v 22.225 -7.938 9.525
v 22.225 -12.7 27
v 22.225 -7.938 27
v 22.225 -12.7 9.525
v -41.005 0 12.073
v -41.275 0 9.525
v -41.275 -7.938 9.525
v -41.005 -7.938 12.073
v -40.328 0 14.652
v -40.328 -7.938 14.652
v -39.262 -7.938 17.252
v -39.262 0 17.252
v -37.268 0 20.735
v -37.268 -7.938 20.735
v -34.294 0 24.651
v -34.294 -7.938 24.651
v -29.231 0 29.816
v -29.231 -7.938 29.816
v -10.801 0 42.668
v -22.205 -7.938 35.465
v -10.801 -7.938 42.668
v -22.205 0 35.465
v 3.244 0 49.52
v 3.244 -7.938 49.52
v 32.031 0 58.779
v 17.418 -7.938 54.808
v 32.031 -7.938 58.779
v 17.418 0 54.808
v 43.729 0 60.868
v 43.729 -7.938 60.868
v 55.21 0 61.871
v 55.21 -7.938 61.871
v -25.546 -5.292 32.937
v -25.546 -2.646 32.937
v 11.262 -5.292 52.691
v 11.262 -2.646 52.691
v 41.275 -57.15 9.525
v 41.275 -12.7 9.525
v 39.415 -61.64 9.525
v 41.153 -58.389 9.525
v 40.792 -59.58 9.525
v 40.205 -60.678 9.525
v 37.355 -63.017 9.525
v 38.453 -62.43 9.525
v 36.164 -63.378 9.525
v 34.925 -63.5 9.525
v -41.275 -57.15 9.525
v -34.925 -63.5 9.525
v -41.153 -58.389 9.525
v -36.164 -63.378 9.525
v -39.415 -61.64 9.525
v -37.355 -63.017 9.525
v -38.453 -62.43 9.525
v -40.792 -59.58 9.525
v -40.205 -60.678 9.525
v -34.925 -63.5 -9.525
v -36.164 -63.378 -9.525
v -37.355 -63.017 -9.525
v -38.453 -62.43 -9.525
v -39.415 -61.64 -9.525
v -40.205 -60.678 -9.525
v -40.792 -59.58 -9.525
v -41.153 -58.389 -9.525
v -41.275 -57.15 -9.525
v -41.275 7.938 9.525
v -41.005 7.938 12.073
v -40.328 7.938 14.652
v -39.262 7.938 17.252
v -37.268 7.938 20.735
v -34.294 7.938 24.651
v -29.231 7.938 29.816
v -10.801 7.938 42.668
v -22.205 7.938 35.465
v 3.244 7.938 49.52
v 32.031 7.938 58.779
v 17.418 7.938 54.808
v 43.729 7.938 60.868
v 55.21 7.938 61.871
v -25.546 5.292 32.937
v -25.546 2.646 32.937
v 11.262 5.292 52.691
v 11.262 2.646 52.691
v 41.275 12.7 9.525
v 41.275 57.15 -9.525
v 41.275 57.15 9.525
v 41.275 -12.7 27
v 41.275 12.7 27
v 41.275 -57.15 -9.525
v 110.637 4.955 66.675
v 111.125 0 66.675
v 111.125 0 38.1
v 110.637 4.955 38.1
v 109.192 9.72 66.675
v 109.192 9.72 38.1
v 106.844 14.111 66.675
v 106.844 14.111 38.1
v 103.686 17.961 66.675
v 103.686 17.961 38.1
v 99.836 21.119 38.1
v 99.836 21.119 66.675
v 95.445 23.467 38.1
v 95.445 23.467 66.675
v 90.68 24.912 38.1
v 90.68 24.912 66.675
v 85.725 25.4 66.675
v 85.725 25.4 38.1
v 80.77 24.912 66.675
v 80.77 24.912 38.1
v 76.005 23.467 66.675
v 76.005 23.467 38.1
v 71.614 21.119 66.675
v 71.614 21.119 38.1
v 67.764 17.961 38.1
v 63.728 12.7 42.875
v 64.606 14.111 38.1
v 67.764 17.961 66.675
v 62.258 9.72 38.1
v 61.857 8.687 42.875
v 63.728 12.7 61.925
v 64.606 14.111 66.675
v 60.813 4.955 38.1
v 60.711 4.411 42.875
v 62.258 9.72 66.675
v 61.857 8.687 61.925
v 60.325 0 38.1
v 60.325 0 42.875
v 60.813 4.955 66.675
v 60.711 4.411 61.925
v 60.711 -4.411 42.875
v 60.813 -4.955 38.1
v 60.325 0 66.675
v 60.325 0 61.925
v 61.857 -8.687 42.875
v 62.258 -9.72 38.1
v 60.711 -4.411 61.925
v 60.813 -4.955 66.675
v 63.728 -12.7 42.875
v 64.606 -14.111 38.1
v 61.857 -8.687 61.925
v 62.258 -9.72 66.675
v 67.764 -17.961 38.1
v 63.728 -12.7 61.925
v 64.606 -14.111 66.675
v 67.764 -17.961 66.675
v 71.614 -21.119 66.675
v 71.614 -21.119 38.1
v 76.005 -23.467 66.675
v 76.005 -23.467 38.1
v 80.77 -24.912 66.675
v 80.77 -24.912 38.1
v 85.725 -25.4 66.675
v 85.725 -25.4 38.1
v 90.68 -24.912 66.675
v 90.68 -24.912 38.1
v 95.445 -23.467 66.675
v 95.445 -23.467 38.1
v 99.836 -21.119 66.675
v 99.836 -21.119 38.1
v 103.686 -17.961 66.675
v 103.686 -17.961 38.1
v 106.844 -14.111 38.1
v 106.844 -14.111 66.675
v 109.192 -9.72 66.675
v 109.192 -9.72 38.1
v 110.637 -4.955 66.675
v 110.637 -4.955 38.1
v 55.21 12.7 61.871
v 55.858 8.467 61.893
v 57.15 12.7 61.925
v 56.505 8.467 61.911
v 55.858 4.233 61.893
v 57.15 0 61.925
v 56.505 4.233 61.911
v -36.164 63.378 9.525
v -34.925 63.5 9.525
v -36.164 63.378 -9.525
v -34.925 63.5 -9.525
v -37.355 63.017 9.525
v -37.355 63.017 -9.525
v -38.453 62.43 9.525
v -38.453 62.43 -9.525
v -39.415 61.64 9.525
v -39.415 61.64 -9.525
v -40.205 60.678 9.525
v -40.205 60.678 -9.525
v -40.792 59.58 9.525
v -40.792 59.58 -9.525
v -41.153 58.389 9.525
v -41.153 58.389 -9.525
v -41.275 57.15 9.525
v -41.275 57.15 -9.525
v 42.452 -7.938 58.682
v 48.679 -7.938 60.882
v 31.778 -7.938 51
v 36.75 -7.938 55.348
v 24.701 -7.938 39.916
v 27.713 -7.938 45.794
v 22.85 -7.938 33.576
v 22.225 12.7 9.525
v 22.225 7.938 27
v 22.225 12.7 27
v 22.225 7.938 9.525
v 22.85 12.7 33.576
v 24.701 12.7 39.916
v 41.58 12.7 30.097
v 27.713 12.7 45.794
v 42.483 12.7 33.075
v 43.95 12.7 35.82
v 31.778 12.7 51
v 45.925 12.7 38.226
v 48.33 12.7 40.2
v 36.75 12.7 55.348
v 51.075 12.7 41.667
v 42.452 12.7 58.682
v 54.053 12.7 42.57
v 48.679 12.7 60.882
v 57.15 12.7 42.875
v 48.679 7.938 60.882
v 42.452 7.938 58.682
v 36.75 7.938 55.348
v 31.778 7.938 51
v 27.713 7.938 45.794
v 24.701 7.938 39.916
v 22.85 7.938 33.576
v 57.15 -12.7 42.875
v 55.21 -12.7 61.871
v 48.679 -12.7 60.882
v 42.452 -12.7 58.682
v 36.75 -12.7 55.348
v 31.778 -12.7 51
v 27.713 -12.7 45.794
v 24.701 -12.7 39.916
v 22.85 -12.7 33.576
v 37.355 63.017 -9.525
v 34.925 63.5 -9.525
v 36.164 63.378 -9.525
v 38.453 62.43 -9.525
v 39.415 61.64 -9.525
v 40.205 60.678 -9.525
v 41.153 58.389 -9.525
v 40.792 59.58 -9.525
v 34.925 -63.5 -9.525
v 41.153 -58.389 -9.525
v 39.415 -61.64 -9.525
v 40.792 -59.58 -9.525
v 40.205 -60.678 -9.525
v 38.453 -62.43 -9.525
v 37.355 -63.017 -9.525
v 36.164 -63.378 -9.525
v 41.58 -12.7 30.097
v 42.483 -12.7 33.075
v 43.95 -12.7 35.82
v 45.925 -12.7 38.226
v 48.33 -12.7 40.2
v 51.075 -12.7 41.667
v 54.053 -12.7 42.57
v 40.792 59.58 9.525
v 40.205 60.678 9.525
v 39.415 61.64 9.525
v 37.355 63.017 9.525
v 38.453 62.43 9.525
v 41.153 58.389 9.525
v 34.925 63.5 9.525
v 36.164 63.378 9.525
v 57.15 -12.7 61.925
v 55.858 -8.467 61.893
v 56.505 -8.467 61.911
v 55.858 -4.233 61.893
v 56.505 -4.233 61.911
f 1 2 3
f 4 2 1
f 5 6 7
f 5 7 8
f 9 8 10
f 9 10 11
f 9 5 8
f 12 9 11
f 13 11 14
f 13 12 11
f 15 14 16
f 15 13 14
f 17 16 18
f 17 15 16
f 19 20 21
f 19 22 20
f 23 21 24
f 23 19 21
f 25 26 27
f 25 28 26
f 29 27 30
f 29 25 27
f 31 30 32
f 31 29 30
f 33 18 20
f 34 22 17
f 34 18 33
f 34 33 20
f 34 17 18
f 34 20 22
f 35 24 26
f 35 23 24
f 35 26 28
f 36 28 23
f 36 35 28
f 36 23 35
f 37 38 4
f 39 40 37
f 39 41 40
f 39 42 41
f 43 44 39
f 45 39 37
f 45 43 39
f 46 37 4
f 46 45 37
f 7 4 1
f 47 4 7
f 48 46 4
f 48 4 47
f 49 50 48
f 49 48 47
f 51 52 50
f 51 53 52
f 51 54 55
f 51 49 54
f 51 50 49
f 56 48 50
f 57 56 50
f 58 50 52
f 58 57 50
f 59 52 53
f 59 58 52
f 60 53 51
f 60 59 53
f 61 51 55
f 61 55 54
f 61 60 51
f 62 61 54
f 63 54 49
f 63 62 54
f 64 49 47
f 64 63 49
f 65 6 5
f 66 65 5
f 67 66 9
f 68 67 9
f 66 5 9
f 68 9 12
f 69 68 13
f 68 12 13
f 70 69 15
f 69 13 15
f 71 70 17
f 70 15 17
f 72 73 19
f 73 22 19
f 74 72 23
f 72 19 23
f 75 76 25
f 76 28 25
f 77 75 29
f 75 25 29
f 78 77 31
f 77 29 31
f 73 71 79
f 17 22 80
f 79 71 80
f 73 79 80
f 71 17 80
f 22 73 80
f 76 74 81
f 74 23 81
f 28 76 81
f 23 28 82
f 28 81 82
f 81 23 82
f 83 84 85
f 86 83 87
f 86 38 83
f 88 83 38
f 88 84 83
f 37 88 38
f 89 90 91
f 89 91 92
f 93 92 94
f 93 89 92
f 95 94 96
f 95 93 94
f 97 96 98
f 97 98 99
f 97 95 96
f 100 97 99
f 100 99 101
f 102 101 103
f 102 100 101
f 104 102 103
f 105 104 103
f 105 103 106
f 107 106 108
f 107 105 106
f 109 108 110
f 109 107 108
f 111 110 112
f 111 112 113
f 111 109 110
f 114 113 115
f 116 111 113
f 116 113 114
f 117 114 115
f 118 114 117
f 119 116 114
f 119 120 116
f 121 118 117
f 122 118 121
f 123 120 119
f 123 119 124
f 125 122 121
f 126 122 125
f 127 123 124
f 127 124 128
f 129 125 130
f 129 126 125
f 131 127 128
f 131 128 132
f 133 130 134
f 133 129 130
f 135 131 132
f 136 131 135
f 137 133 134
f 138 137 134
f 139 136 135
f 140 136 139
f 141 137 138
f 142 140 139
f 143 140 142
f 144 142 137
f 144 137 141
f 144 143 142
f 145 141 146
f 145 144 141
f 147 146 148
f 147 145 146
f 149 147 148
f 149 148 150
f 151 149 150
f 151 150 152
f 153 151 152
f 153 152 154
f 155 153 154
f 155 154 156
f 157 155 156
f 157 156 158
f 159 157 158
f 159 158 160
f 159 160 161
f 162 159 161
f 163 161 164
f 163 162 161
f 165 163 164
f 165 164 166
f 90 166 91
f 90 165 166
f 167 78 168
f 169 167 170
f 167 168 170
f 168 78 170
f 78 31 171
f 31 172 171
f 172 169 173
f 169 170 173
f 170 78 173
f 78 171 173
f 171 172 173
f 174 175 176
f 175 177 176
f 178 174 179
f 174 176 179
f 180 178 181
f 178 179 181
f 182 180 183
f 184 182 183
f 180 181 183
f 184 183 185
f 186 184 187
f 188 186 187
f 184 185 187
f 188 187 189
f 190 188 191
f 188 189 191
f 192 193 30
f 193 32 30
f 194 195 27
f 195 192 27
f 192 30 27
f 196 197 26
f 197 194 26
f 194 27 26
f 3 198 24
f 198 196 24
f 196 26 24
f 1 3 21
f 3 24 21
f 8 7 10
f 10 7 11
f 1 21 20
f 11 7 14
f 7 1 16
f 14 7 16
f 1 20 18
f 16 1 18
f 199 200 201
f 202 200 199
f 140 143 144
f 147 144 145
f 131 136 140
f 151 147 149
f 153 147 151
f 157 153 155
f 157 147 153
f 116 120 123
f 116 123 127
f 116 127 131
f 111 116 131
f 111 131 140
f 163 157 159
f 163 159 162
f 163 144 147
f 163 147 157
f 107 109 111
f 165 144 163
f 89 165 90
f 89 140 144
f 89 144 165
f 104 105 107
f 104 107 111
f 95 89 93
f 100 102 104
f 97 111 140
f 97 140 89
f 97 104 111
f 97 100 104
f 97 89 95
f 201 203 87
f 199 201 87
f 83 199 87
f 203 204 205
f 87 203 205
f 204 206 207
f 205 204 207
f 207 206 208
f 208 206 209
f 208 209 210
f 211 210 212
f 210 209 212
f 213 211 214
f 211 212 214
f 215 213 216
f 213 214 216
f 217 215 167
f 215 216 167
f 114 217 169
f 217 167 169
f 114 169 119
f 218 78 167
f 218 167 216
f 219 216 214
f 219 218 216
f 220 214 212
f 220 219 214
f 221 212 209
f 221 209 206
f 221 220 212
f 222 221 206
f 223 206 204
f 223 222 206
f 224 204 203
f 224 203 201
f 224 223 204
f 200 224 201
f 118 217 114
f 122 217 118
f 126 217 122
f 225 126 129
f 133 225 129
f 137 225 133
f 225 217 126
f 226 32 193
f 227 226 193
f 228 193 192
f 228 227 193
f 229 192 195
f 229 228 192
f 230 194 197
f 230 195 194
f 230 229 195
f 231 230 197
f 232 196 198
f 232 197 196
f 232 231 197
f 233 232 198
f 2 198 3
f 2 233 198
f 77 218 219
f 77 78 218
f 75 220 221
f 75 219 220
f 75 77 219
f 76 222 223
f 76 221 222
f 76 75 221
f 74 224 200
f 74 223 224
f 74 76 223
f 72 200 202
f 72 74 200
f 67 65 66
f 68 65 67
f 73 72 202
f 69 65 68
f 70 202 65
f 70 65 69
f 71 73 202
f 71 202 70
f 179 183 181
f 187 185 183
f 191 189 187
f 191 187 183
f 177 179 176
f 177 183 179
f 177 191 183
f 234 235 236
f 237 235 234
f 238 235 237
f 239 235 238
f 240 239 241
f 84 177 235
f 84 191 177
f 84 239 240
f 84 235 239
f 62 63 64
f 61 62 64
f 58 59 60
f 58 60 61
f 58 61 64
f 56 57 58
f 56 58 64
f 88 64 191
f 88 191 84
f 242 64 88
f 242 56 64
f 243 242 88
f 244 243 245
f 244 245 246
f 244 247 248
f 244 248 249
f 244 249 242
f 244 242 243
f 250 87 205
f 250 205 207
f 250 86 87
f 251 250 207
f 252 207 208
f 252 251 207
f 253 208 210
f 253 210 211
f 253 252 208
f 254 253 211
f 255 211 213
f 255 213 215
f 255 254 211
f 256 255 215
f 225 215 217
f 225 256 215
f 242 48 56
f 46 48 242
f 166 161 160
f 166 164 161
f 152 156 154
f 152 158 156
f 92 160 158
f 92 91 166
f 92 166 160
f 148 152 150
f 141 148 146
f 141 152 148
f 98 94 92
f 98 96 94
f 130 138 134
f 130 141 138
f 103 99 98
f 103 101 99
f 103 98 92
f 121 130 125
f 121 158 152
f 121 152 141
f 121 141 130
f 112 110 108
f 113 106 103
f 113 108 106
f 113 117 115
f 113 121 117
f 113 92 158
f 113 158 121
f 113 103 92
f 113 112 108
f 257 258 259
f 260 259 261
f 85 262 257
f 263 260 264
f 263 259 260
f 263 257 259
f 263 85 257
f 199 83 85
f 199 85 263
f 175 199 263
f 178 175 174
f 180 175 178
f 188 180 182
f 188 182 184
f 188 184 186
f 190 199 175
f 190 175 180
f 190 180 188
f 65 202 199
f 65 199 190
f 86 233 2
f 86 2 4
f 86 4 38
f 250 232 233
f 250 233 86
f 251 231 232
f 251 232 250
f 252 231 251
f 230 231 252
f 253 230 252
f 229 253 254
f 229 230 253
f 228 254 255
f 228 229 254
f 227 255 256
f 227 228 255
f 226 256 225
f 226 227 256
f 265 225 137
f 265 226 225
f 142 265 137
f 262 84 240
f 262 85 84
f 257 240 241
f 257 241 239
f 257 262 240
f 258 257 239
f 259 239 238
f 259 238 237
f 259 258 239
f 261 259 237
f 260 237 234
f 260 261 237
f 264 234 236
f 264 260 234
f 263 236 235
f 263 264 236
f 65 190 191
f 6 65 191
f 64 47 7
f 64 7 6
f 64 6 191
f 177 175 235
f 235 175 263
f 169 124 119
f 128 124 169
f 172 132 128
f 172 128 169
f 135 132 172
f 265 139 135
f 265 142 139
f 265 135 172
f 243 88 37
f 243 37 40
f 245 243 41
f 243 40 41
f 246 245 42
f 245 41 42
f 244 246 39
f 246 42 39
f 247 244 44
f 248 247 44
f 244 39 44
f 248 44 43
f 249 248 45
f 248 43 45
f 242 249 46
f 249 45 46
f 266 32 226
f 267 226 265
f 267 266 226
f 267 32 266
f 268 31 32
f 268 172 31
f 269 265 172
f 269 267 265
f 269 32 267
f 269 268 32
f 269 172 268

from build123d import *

# Parameters (mm, degrees)
F1_DEPTH = 63.5
F0_W     = 25.4
F0_H     = 19.05
F2_DEPTH = 12.7
F3_DEPTH = 7.9375
F5_R     = 6.35


with BuildPart() as f1:
    # F0 (on Front) → F1 (new body, symmetric)
    with BuildSketch(Plane.XZ):
        Polygon((22.225, 9.525), (-41.275, 9.525), (-41.275, -9.525), (41.275, -9.525), (41.275, 9.525), align=None)
    extrude(amount=F1_DEPTH, both=True)

    # F0 (on Front) → F2 (join, symmetric)
    with BuildSketch(Plane.XZ):
        with Locations((73.025, 52.4002)):
            Rectangle(F0_W, F0_H)
        with BuildLine():
            Line((22.225, 27.0002), (22.225, 9.525))
            Line((22.225, 9.525), (41.275, 9.525))
            Line((41.275, 9.525), (41.275, 27.0002))
            ThreePointArc((41.275, 27.0002), (45.9246798487, 38.2255201513), (57.15, 42.8752))
            Line((57.15, 42.8752), (60.325, 42.8752))
            Line((60.325, 42.8752), (60.325, 61.9252))
            Line((60.325, 61.9252), (57.15, 61.9252))
            add(Edge.make_bspline(
                [(55.2099659043, 61.8712753019), (55.8590535699, 61.8953003864), (56.5058041555, 61.9133112934), (57.15, 61.9252)],
                knots=[109.841532406, 109.841532406, 109.841532406, 109.841532406, 111.5045361635, 111.5045361635, 111.5045361635, 111.5045361635], degree=3))
            ThreePointArc((55.2099659043, 61.8712753019), (31.7776595897, 51.0001993147), (22.225, 27.0002))
        make_face()
    extrude(amount=F2_DEPTH, both=True)

    # F0 (on Front) → F3 (join, symmetric)
    with BuildSketch(Plane.XZ):
        with BuildLine():
            add(Edge.make_bspline(
                [(-41.275, 9.525), (-40.7303956796, 32.4600275426), (12.3376731995, 60.2844165268), (55.2099659043, 61.8712753019)],
                knots=[0, 0, 0, 0, 109.841532406, 109.841532406, 109.841532406, 109.841532406], degree=3))
            Line((-41.275, 9.525), (22.225, 9.525))
            Line((22.225, 9.525), (22.225, 27.0002))
            ThreePointArc((22.225, 27.0002), (31.7776595897, 51.0001993147), (55.2099659043, 61.8712753019))
        make_face()
    extrude(amount=F3_DEPTH, both=True)

    # F0 (on Front) → F4 (revolve)
    with BuildSketch(Plane.XZ):
        Polygon((85.725, 66.675), (85.725, 61.9252), (85.725, 42.8752), (85.725, 38.1), (111.125, 38.1), (111.125, 66.675), align=None)
    revolve(axis=Axis((85.725, 0, 52.3875), (0, 0, 1)))

    # F5
    f5_edges = [f1.edges().sort_by_distance(p)[0] for p in [
        (-41.275, -63.5, 0),
        (41.275, -63.5, 0),
        (41.275, 63.5, 0),
        (-41.275, 63.5, 0),
    ]]
    fillet(f5_edges, radius=F5_R)


solid = f1.part
